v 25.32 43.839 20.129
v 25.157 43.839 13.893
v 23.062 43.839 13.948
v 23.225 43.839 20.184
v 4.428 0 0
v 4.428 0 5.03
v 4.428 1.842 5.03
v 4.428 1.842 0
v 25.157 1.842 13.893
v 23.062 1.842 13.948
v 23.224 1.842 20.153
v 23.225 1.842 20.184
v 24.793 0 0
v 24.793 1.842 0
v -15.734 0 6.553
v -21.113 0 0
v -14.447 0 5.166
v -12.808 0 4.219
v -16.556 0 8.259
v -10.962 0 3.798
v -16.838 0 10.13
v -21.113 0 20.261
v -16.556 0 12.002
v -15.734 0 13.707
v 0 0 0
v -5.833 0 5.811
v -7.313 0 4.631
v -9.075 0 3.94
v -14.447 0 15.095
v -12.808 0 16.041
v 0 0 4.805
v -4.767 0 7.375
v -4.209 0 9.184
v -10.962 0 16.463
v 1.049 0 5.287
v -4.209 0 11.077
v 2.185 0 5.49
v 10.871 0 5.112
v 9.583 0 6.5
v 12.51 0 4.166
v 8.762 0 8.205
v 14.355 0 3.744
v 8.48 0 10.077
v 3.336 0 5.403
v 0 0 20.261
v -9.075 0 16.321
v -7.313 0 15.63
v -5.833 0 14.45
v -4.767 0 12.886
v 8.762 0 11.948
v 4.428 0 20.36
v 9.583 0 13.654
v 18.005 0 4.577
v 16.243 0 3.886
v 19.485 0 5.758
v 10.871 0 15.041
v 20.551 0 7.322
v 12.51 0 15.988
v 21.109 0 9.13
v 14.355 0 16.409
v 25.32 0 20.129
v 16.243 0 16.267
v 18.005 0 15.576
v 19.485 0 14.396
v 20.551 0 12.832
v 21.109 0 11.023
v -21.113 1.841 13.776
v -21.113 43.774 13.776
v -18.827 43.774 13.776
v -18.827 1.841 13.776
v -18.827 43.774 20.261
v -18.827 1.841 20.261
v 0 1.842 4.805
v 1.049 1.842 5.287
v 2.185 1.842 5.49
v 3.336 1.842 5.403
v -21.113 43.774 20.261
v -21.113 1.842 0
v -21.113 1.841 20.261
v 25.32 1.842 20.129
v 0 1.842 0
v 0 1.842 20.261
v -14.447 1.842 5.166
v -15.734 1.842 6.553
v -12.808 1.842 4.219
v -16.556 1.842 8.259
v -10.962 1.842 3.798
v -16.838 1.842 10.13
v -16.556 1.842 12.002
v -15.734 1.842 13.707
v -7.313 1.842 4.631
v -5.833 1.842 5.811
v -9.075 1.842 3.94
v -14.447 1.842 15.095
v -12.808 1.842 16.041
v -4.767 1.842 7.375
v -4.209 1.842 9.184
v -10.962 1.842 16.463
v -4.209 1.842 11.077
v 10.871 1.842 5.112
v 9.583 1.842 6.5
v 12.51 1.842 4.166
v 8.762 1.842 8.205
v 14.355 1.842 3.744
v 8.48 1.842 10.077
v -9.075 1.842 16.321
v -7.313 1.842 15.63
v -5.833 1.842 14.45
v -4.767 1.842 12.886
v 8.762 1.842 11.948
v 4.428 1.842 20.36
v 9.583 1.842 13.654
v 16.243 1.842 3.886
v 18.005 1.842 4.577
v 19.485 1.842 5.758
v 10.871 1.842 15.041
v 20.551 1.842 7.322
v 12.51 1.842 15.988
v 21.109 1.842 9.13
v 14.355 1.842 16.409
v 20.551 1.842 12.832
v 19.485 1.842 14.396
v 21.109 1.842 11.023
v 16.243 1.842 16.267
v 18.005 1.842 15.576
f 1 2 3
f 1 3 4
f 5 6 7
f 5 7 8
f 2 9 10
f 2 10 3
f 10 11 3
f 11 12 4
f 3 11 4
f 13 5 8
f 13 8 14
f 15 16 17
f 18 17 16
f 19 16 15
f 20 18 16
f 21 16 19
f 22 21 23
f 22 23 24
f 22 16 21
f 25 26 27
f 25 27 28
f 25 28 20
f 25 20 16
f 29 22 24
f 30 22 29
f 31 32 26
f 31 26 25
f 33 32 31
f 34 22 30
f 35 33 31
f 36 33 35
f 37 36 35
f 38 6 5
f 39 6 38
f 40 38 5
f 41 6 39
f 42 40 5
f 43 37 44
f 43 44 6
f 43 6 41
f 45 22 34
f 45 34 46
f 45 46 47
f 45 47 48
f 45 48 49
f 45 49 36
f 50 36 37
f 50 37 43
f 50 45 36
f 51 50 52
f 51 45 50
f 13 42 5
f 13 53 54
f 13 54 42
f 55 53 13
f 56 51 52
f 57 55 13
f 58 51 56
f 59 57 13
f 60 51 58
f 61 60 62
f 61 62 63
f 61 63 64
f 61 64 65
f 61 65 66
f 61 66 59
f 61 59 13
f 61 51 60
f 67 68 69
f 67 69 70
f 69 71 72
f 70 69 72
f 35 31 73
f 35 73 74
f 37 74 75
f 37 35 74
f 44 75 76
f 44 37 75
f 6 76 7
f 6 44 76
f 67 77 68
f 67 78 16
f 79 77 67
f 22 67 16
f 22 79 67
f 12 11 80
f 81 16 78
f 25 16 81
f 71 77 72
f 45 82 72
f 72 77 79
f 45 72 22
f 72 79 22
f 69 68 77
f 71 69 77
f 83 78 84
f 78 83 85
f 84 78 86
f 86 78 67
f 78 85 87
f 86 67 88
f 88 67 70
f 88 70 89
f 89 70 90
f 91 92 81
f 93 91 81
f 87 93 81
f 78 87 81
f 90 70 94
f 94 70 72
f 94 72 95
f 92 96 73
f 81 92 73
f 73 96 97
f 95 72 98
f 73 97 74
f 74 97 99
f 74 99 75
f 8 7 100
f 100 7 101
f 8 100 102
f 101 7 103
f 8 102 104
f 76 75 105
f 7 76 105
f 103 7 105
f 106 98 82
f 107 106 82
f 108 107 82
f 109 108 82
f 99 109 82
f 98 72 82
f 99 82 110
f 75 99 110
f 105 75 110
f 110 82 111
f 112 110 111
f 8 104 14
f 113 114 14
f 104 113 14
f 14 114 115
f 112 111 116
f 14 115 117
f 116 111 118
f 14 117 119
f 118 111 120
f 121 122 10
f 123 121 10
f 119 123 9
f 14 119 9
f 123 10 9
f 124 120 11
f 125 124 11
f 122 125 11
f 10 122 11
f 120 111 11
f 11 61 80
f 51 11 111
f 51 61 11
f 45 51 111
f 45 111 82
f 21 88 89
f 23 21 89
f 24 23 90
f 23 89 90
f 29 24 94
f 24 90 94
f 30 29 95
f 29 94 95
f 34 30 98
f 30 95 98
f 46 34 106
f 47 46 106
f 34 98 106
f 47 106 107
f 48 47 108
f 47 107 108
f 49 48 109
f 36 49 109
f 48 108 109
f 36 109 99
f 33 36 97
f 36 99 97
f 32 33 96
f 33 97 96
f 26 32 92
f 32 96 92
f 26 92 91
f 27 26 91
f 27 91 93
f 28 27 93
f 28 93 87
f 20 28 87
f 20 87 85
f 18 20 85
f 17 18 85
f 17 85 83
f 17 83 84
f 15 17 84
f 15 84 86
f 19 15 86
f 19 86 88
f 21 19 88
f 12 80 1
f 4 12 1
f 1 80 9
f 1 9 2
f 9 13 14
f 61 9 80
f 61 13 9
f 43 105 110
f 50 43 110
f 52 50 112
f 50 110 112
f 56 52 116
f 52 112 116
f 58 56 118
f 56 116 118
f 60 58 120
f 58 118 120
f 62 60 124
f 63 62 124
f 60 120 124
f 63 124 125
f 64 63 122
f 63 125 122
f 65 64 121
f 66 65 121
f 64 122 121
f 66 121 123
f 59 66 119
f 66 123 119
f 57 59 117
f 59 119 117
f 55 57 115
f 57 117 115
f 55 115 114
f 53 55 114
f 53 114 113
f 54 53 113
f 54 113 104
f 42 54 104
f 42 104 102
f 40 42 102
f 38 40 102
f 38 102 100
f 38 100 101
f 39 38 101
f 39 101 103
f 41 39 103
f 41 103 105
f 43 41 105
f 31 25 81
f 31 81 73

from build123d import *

# Parameters (mm, degrees)
F0_R     = 9.7397478584
F0_R_2   = 9.242675957
F1_DEPTH = 1.8415
F2_D     = 12.7
F4_W     = 41.9321846507
F4_H     = 6.4849769697
F5_DEPTH = 2.286
F3_W     = 41.9973064504
F3_H     = 6.2387038374
F6_DEPTH = 2.0955


# Not quite as in the source:
# - a feature names something its author has since deleted; it is built from what else it names


with BuildPart() as f1:
    # F0 (on Front) → F1 (new body)
    with BuildSketch(Plane.XZ):
        with BuildLine():
            Line((0, 4.8052047364), (0, 20.2608313411))
            Line((0, 20.2608313411), (-21.113075316, 20.2608313411))
            Line((-21.113075316, 20.2608313411), (-21.113075316, 0))
            Line((-21.113075316, 0), (-2.0606040489, 0))
            ThreePointArc((-2.0606040489, 0), (-1.7849391427, 2.7262115351), (0, 4.8052047364))
        make_face()
        with Locations((-10.4878218845, 10.1304156706)):
            Circle(F0_R, mode=Mode.SUBTRACT)
        with BuildLine():
            Line((25.3197303883, 20.1294401959), (4.4281314508, 20.3600343892))
            Line((4.4281314508, 20.3600343892), (4.4281314508, 19.6842234582))
            Line((4.4281314508, 19.6842234582), (4.4281314508, 5.0302978839))
            ThreePointArc((4.4281314508, 5.0302978839), (6.5221702803, 2.937211036), (6.8947323598, 0))
            Line((6.8947323598, 0), (24.7934444089, 0))
            Line((24.7934444089, 0), (25.3197303883, 20.1294401959))
        make_face()
        with Locations((14.8297464475, 10.0766858086)):
            Circle(F0_R_2, mode=Mode.SUBTRACT)
        with Locations((-10.4878218845, 10.1304156706)):
            Circle(F0_R)
        with Locations((14.8297464475, 10.0766858086)):
            Circle(F0_R_2)
        with BuildLine():
            Line((4.4281314508, 20.3600343892), (0, 20.2608313411))
            Line((0, 20.2608313411), (0, 4.8052047364))
            ThreePointArc((0, 4.8052047364), (2.1849540655, 5.490448695), (4.4281314508, 5.0302978839))
            Line((4.4281314508, 5.0302978839), (4.4281314508, 19.6842234582))
            Line((4.4281314508, 19.6842234582), (4.4281314508, 20.3600343892))
        make_face()
        with BuildLine():
            ThreePointArc((6.8947323598, 0), (6.5221702803, 2.937211036), (4.4281314508, 5.0302978839))
            Line((4.4281314508, 5.0302978839), (4.4281314508, 0))
            Line((4.4281314508, 0), (6.8947323598, 0))
        make_face()
        with BuildLine():
            Line((0, 0), (0, 4.8052047364))
            ThreePointArc((0, 4.8052047364), (-1.7849391427, 2.7262115351), (-2.0606040489, 0))
            Line((-2.0606040489, 0), (0, 0))
        make_face()
    extrude(amount=-F1_DEPTH)

    # F2 (through all)
    with Locations(Plane.XZ):
        with Locations((-10.4878218845, 10.1304156706), (14.8297464475, 10.0766858086)):
            Hole(F2_D / 2)

    # F4 (on face) → F5 (join)
    with BuildSketch(Plane(origin=(-21.113075316, 0, 0), x_dir=(0, -1, 0), z_dir=(-1, 0, 0))):
        with Locations((-22.8075923253, 17.0183428563)):
            Rectangle(F4_W, F4_H)
    extrude(amount=-F5_DEPTH)

    # F3 (on face) → F6 (join)
    with BuildSketch(Plane(origin=(24.77650804, 0, -0.6477839757), x_dir=(0, 1, 0), z_dir=(0.9996583923, 0, -0.0261361563))):
        with Locations((22.8401532252, 17.6649723378)):
            Rectangle(F3_W, F3_H)
    extrude(amount=-F6_DEPTH)


solid = f1.part
